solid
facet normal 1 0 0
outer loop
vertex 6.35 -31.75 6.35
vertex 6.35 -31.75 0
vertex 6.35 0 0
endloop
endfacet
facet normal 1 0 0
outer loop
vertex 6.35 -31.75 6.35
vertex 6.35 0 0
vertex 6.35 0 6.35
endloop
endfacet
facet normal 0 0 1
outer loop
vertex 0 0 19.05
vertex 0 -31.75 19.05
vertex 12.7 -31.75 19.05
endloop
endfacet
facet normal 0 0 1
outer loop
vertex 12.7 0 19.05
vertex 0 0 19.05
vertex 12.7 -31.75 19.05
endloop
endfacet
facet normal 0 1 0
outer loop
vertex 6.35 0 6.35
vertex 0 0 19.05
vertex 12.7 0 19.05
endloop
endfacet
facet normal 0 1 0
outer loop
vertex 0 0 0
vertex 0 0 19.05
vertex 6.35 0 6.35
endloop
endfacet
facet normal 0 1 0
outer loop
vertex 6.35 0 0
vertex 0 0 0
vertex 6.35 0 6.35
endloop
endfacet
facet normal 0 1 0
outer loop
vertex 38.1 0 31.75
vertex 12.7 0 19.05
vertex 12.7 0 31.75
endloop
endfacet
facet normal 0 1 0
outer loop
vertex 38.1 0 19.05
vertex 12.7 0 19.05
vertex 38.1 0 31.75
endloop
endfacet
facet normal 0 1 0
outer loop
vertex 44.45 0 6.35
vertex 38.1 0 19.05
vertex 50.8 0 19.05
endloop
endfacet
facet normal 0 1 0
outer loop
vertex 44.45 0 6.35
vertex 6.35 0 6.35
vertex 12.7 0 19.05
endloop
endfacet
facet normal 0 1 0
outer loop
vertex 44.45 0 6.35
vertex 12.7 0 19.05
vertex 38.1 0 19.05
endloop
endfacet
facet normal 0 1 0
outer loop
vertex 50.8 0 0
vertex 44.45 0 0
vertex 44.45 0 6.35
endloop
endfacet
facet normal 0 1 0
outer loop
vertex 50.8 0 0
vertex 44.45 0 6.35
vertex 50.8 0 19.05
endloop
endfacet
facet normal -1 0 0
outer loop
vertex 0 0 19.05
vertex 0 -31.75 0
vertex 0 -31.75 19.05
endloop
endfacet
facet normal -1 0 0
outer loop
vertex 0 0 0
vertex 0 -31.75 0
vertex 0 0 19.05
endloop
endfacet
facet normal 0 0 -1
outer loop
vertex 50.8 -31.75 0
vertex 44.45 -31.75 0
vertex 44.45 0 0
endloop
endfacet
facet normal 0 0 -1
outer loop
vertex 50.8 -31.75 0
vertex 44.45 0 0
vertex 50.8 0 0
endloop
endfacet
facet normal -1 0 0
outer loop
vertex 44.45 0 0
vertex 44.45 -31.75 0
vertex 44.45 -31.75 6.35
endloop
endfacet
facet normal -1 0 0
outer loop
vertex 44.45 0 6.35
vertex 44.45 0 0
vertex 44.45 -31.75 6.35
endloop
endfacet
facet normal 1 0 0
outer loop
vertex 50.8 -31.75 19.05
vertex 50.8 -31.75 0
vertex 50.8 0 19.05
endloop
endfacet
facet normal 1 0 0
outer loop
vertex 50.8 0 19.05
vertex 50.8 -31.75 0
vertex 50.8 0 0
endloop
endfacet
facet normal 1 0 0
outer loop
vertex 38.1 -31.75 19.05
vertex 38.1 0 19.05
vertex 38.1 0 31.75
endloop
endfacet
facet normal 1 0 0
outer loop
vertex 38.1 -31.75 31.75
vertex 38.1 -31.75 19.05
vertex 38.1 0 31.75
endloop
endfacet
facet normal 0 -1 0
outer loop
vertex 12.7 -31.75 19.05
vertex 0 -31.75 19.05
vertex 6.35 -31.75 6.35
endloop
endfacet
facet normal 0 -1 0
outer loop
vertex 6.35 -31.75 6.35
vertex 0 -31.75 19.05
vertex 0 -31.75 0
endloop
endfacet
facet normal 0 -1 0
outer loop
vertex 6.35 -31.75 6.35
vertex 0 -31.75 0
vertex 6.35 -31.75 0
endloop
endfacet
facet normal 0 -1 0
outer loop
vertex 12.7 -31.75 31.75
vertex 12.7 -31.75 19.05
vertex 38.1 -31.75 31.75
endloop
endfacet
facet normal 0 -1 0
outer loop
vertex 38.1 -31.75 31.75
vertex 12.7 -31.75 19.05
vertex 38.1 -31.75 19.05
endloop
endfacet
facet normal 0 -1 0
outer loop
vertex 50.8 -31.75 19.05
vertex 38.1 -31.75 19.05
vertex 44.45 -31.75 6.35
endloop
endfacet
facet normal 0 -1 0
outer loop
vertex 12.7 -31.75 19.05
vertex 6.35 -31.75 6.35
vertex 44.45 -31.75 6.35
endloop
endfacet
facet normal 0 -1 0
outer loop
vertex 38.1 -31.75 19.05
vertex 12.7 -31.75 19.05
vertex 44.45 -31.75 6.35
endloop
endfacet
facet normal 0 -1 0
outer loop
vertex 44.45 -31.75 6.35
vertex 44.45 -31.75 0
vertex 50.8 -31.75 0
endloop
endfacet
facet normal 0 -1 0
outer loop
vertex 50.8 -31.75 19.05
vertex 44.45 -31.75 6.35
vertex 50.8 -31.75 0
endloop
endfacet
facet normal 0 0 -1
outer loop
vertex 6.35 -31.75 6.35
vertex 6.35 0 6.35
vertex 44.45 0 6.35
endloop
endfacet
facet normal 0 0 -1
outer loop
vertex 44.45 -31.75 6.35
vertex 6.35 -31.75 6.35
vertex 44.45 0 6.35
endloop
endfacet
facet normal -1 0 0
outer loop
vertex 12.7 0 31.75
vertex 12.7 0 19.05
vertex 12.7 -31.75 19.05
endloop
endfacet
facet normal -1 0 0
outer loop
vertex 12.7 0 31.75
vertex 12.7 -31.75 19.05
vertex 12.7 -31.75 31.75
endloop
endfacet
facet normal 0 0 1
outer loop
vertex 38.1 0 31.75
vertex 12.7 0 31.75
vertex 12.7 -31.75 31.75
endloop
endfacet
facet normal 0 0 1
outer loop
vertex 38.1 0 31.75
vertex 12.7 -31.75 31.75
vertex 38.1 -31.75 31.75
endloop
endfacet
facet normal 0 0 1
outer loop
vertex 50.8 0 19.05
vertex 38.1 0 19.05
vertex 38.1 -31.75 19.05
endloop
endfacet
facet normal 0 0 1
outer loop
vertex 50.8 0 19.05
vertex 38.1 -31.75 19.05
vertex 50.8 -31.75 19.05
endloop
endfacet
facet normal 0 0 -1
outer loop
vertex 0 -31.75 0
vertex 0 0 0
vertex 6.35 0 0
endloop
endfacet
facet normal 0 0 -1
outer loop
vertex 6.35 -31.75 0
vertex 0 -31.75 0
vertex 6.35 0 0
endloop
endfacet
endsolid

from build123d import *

# Parameters (mm, degrees)
F0_W     = 50.8
F0_H     = 31.75
F1_DEPTH = 31.75
F2_W     = 12.7
F2_H     = 12.7
F2_W_2   = 38.1
F2_H_2   = 6.35
F3_DEPTH = 56.642


with BuildPart() as f1:
    # F0 (on Top) → F1 (new body)
    with BuildSketch(Plane.XY):
        with Locations((25.4, -15.875)):
            Rectangle(F0_W, F0_H)
    extrude(amount=F1_DEPTH)

    # F2 (on Front) → F3 (cut)
    with BuildSketch(Plane.XZ):
        with Locations((6.35, 25.4)):
            Rectangle(F2_W, F2_H)
        with Locations((44.45, 25.4)):
            Rectangle(F2_W, F2_H)
        with Locations((25.4, 3.175)):
            Rectangle(F2_W_2, F2_H_2)
    extrude(amount=F3_DEPTH, mode=Mode.SUBTRACT)


solid = f1.part
